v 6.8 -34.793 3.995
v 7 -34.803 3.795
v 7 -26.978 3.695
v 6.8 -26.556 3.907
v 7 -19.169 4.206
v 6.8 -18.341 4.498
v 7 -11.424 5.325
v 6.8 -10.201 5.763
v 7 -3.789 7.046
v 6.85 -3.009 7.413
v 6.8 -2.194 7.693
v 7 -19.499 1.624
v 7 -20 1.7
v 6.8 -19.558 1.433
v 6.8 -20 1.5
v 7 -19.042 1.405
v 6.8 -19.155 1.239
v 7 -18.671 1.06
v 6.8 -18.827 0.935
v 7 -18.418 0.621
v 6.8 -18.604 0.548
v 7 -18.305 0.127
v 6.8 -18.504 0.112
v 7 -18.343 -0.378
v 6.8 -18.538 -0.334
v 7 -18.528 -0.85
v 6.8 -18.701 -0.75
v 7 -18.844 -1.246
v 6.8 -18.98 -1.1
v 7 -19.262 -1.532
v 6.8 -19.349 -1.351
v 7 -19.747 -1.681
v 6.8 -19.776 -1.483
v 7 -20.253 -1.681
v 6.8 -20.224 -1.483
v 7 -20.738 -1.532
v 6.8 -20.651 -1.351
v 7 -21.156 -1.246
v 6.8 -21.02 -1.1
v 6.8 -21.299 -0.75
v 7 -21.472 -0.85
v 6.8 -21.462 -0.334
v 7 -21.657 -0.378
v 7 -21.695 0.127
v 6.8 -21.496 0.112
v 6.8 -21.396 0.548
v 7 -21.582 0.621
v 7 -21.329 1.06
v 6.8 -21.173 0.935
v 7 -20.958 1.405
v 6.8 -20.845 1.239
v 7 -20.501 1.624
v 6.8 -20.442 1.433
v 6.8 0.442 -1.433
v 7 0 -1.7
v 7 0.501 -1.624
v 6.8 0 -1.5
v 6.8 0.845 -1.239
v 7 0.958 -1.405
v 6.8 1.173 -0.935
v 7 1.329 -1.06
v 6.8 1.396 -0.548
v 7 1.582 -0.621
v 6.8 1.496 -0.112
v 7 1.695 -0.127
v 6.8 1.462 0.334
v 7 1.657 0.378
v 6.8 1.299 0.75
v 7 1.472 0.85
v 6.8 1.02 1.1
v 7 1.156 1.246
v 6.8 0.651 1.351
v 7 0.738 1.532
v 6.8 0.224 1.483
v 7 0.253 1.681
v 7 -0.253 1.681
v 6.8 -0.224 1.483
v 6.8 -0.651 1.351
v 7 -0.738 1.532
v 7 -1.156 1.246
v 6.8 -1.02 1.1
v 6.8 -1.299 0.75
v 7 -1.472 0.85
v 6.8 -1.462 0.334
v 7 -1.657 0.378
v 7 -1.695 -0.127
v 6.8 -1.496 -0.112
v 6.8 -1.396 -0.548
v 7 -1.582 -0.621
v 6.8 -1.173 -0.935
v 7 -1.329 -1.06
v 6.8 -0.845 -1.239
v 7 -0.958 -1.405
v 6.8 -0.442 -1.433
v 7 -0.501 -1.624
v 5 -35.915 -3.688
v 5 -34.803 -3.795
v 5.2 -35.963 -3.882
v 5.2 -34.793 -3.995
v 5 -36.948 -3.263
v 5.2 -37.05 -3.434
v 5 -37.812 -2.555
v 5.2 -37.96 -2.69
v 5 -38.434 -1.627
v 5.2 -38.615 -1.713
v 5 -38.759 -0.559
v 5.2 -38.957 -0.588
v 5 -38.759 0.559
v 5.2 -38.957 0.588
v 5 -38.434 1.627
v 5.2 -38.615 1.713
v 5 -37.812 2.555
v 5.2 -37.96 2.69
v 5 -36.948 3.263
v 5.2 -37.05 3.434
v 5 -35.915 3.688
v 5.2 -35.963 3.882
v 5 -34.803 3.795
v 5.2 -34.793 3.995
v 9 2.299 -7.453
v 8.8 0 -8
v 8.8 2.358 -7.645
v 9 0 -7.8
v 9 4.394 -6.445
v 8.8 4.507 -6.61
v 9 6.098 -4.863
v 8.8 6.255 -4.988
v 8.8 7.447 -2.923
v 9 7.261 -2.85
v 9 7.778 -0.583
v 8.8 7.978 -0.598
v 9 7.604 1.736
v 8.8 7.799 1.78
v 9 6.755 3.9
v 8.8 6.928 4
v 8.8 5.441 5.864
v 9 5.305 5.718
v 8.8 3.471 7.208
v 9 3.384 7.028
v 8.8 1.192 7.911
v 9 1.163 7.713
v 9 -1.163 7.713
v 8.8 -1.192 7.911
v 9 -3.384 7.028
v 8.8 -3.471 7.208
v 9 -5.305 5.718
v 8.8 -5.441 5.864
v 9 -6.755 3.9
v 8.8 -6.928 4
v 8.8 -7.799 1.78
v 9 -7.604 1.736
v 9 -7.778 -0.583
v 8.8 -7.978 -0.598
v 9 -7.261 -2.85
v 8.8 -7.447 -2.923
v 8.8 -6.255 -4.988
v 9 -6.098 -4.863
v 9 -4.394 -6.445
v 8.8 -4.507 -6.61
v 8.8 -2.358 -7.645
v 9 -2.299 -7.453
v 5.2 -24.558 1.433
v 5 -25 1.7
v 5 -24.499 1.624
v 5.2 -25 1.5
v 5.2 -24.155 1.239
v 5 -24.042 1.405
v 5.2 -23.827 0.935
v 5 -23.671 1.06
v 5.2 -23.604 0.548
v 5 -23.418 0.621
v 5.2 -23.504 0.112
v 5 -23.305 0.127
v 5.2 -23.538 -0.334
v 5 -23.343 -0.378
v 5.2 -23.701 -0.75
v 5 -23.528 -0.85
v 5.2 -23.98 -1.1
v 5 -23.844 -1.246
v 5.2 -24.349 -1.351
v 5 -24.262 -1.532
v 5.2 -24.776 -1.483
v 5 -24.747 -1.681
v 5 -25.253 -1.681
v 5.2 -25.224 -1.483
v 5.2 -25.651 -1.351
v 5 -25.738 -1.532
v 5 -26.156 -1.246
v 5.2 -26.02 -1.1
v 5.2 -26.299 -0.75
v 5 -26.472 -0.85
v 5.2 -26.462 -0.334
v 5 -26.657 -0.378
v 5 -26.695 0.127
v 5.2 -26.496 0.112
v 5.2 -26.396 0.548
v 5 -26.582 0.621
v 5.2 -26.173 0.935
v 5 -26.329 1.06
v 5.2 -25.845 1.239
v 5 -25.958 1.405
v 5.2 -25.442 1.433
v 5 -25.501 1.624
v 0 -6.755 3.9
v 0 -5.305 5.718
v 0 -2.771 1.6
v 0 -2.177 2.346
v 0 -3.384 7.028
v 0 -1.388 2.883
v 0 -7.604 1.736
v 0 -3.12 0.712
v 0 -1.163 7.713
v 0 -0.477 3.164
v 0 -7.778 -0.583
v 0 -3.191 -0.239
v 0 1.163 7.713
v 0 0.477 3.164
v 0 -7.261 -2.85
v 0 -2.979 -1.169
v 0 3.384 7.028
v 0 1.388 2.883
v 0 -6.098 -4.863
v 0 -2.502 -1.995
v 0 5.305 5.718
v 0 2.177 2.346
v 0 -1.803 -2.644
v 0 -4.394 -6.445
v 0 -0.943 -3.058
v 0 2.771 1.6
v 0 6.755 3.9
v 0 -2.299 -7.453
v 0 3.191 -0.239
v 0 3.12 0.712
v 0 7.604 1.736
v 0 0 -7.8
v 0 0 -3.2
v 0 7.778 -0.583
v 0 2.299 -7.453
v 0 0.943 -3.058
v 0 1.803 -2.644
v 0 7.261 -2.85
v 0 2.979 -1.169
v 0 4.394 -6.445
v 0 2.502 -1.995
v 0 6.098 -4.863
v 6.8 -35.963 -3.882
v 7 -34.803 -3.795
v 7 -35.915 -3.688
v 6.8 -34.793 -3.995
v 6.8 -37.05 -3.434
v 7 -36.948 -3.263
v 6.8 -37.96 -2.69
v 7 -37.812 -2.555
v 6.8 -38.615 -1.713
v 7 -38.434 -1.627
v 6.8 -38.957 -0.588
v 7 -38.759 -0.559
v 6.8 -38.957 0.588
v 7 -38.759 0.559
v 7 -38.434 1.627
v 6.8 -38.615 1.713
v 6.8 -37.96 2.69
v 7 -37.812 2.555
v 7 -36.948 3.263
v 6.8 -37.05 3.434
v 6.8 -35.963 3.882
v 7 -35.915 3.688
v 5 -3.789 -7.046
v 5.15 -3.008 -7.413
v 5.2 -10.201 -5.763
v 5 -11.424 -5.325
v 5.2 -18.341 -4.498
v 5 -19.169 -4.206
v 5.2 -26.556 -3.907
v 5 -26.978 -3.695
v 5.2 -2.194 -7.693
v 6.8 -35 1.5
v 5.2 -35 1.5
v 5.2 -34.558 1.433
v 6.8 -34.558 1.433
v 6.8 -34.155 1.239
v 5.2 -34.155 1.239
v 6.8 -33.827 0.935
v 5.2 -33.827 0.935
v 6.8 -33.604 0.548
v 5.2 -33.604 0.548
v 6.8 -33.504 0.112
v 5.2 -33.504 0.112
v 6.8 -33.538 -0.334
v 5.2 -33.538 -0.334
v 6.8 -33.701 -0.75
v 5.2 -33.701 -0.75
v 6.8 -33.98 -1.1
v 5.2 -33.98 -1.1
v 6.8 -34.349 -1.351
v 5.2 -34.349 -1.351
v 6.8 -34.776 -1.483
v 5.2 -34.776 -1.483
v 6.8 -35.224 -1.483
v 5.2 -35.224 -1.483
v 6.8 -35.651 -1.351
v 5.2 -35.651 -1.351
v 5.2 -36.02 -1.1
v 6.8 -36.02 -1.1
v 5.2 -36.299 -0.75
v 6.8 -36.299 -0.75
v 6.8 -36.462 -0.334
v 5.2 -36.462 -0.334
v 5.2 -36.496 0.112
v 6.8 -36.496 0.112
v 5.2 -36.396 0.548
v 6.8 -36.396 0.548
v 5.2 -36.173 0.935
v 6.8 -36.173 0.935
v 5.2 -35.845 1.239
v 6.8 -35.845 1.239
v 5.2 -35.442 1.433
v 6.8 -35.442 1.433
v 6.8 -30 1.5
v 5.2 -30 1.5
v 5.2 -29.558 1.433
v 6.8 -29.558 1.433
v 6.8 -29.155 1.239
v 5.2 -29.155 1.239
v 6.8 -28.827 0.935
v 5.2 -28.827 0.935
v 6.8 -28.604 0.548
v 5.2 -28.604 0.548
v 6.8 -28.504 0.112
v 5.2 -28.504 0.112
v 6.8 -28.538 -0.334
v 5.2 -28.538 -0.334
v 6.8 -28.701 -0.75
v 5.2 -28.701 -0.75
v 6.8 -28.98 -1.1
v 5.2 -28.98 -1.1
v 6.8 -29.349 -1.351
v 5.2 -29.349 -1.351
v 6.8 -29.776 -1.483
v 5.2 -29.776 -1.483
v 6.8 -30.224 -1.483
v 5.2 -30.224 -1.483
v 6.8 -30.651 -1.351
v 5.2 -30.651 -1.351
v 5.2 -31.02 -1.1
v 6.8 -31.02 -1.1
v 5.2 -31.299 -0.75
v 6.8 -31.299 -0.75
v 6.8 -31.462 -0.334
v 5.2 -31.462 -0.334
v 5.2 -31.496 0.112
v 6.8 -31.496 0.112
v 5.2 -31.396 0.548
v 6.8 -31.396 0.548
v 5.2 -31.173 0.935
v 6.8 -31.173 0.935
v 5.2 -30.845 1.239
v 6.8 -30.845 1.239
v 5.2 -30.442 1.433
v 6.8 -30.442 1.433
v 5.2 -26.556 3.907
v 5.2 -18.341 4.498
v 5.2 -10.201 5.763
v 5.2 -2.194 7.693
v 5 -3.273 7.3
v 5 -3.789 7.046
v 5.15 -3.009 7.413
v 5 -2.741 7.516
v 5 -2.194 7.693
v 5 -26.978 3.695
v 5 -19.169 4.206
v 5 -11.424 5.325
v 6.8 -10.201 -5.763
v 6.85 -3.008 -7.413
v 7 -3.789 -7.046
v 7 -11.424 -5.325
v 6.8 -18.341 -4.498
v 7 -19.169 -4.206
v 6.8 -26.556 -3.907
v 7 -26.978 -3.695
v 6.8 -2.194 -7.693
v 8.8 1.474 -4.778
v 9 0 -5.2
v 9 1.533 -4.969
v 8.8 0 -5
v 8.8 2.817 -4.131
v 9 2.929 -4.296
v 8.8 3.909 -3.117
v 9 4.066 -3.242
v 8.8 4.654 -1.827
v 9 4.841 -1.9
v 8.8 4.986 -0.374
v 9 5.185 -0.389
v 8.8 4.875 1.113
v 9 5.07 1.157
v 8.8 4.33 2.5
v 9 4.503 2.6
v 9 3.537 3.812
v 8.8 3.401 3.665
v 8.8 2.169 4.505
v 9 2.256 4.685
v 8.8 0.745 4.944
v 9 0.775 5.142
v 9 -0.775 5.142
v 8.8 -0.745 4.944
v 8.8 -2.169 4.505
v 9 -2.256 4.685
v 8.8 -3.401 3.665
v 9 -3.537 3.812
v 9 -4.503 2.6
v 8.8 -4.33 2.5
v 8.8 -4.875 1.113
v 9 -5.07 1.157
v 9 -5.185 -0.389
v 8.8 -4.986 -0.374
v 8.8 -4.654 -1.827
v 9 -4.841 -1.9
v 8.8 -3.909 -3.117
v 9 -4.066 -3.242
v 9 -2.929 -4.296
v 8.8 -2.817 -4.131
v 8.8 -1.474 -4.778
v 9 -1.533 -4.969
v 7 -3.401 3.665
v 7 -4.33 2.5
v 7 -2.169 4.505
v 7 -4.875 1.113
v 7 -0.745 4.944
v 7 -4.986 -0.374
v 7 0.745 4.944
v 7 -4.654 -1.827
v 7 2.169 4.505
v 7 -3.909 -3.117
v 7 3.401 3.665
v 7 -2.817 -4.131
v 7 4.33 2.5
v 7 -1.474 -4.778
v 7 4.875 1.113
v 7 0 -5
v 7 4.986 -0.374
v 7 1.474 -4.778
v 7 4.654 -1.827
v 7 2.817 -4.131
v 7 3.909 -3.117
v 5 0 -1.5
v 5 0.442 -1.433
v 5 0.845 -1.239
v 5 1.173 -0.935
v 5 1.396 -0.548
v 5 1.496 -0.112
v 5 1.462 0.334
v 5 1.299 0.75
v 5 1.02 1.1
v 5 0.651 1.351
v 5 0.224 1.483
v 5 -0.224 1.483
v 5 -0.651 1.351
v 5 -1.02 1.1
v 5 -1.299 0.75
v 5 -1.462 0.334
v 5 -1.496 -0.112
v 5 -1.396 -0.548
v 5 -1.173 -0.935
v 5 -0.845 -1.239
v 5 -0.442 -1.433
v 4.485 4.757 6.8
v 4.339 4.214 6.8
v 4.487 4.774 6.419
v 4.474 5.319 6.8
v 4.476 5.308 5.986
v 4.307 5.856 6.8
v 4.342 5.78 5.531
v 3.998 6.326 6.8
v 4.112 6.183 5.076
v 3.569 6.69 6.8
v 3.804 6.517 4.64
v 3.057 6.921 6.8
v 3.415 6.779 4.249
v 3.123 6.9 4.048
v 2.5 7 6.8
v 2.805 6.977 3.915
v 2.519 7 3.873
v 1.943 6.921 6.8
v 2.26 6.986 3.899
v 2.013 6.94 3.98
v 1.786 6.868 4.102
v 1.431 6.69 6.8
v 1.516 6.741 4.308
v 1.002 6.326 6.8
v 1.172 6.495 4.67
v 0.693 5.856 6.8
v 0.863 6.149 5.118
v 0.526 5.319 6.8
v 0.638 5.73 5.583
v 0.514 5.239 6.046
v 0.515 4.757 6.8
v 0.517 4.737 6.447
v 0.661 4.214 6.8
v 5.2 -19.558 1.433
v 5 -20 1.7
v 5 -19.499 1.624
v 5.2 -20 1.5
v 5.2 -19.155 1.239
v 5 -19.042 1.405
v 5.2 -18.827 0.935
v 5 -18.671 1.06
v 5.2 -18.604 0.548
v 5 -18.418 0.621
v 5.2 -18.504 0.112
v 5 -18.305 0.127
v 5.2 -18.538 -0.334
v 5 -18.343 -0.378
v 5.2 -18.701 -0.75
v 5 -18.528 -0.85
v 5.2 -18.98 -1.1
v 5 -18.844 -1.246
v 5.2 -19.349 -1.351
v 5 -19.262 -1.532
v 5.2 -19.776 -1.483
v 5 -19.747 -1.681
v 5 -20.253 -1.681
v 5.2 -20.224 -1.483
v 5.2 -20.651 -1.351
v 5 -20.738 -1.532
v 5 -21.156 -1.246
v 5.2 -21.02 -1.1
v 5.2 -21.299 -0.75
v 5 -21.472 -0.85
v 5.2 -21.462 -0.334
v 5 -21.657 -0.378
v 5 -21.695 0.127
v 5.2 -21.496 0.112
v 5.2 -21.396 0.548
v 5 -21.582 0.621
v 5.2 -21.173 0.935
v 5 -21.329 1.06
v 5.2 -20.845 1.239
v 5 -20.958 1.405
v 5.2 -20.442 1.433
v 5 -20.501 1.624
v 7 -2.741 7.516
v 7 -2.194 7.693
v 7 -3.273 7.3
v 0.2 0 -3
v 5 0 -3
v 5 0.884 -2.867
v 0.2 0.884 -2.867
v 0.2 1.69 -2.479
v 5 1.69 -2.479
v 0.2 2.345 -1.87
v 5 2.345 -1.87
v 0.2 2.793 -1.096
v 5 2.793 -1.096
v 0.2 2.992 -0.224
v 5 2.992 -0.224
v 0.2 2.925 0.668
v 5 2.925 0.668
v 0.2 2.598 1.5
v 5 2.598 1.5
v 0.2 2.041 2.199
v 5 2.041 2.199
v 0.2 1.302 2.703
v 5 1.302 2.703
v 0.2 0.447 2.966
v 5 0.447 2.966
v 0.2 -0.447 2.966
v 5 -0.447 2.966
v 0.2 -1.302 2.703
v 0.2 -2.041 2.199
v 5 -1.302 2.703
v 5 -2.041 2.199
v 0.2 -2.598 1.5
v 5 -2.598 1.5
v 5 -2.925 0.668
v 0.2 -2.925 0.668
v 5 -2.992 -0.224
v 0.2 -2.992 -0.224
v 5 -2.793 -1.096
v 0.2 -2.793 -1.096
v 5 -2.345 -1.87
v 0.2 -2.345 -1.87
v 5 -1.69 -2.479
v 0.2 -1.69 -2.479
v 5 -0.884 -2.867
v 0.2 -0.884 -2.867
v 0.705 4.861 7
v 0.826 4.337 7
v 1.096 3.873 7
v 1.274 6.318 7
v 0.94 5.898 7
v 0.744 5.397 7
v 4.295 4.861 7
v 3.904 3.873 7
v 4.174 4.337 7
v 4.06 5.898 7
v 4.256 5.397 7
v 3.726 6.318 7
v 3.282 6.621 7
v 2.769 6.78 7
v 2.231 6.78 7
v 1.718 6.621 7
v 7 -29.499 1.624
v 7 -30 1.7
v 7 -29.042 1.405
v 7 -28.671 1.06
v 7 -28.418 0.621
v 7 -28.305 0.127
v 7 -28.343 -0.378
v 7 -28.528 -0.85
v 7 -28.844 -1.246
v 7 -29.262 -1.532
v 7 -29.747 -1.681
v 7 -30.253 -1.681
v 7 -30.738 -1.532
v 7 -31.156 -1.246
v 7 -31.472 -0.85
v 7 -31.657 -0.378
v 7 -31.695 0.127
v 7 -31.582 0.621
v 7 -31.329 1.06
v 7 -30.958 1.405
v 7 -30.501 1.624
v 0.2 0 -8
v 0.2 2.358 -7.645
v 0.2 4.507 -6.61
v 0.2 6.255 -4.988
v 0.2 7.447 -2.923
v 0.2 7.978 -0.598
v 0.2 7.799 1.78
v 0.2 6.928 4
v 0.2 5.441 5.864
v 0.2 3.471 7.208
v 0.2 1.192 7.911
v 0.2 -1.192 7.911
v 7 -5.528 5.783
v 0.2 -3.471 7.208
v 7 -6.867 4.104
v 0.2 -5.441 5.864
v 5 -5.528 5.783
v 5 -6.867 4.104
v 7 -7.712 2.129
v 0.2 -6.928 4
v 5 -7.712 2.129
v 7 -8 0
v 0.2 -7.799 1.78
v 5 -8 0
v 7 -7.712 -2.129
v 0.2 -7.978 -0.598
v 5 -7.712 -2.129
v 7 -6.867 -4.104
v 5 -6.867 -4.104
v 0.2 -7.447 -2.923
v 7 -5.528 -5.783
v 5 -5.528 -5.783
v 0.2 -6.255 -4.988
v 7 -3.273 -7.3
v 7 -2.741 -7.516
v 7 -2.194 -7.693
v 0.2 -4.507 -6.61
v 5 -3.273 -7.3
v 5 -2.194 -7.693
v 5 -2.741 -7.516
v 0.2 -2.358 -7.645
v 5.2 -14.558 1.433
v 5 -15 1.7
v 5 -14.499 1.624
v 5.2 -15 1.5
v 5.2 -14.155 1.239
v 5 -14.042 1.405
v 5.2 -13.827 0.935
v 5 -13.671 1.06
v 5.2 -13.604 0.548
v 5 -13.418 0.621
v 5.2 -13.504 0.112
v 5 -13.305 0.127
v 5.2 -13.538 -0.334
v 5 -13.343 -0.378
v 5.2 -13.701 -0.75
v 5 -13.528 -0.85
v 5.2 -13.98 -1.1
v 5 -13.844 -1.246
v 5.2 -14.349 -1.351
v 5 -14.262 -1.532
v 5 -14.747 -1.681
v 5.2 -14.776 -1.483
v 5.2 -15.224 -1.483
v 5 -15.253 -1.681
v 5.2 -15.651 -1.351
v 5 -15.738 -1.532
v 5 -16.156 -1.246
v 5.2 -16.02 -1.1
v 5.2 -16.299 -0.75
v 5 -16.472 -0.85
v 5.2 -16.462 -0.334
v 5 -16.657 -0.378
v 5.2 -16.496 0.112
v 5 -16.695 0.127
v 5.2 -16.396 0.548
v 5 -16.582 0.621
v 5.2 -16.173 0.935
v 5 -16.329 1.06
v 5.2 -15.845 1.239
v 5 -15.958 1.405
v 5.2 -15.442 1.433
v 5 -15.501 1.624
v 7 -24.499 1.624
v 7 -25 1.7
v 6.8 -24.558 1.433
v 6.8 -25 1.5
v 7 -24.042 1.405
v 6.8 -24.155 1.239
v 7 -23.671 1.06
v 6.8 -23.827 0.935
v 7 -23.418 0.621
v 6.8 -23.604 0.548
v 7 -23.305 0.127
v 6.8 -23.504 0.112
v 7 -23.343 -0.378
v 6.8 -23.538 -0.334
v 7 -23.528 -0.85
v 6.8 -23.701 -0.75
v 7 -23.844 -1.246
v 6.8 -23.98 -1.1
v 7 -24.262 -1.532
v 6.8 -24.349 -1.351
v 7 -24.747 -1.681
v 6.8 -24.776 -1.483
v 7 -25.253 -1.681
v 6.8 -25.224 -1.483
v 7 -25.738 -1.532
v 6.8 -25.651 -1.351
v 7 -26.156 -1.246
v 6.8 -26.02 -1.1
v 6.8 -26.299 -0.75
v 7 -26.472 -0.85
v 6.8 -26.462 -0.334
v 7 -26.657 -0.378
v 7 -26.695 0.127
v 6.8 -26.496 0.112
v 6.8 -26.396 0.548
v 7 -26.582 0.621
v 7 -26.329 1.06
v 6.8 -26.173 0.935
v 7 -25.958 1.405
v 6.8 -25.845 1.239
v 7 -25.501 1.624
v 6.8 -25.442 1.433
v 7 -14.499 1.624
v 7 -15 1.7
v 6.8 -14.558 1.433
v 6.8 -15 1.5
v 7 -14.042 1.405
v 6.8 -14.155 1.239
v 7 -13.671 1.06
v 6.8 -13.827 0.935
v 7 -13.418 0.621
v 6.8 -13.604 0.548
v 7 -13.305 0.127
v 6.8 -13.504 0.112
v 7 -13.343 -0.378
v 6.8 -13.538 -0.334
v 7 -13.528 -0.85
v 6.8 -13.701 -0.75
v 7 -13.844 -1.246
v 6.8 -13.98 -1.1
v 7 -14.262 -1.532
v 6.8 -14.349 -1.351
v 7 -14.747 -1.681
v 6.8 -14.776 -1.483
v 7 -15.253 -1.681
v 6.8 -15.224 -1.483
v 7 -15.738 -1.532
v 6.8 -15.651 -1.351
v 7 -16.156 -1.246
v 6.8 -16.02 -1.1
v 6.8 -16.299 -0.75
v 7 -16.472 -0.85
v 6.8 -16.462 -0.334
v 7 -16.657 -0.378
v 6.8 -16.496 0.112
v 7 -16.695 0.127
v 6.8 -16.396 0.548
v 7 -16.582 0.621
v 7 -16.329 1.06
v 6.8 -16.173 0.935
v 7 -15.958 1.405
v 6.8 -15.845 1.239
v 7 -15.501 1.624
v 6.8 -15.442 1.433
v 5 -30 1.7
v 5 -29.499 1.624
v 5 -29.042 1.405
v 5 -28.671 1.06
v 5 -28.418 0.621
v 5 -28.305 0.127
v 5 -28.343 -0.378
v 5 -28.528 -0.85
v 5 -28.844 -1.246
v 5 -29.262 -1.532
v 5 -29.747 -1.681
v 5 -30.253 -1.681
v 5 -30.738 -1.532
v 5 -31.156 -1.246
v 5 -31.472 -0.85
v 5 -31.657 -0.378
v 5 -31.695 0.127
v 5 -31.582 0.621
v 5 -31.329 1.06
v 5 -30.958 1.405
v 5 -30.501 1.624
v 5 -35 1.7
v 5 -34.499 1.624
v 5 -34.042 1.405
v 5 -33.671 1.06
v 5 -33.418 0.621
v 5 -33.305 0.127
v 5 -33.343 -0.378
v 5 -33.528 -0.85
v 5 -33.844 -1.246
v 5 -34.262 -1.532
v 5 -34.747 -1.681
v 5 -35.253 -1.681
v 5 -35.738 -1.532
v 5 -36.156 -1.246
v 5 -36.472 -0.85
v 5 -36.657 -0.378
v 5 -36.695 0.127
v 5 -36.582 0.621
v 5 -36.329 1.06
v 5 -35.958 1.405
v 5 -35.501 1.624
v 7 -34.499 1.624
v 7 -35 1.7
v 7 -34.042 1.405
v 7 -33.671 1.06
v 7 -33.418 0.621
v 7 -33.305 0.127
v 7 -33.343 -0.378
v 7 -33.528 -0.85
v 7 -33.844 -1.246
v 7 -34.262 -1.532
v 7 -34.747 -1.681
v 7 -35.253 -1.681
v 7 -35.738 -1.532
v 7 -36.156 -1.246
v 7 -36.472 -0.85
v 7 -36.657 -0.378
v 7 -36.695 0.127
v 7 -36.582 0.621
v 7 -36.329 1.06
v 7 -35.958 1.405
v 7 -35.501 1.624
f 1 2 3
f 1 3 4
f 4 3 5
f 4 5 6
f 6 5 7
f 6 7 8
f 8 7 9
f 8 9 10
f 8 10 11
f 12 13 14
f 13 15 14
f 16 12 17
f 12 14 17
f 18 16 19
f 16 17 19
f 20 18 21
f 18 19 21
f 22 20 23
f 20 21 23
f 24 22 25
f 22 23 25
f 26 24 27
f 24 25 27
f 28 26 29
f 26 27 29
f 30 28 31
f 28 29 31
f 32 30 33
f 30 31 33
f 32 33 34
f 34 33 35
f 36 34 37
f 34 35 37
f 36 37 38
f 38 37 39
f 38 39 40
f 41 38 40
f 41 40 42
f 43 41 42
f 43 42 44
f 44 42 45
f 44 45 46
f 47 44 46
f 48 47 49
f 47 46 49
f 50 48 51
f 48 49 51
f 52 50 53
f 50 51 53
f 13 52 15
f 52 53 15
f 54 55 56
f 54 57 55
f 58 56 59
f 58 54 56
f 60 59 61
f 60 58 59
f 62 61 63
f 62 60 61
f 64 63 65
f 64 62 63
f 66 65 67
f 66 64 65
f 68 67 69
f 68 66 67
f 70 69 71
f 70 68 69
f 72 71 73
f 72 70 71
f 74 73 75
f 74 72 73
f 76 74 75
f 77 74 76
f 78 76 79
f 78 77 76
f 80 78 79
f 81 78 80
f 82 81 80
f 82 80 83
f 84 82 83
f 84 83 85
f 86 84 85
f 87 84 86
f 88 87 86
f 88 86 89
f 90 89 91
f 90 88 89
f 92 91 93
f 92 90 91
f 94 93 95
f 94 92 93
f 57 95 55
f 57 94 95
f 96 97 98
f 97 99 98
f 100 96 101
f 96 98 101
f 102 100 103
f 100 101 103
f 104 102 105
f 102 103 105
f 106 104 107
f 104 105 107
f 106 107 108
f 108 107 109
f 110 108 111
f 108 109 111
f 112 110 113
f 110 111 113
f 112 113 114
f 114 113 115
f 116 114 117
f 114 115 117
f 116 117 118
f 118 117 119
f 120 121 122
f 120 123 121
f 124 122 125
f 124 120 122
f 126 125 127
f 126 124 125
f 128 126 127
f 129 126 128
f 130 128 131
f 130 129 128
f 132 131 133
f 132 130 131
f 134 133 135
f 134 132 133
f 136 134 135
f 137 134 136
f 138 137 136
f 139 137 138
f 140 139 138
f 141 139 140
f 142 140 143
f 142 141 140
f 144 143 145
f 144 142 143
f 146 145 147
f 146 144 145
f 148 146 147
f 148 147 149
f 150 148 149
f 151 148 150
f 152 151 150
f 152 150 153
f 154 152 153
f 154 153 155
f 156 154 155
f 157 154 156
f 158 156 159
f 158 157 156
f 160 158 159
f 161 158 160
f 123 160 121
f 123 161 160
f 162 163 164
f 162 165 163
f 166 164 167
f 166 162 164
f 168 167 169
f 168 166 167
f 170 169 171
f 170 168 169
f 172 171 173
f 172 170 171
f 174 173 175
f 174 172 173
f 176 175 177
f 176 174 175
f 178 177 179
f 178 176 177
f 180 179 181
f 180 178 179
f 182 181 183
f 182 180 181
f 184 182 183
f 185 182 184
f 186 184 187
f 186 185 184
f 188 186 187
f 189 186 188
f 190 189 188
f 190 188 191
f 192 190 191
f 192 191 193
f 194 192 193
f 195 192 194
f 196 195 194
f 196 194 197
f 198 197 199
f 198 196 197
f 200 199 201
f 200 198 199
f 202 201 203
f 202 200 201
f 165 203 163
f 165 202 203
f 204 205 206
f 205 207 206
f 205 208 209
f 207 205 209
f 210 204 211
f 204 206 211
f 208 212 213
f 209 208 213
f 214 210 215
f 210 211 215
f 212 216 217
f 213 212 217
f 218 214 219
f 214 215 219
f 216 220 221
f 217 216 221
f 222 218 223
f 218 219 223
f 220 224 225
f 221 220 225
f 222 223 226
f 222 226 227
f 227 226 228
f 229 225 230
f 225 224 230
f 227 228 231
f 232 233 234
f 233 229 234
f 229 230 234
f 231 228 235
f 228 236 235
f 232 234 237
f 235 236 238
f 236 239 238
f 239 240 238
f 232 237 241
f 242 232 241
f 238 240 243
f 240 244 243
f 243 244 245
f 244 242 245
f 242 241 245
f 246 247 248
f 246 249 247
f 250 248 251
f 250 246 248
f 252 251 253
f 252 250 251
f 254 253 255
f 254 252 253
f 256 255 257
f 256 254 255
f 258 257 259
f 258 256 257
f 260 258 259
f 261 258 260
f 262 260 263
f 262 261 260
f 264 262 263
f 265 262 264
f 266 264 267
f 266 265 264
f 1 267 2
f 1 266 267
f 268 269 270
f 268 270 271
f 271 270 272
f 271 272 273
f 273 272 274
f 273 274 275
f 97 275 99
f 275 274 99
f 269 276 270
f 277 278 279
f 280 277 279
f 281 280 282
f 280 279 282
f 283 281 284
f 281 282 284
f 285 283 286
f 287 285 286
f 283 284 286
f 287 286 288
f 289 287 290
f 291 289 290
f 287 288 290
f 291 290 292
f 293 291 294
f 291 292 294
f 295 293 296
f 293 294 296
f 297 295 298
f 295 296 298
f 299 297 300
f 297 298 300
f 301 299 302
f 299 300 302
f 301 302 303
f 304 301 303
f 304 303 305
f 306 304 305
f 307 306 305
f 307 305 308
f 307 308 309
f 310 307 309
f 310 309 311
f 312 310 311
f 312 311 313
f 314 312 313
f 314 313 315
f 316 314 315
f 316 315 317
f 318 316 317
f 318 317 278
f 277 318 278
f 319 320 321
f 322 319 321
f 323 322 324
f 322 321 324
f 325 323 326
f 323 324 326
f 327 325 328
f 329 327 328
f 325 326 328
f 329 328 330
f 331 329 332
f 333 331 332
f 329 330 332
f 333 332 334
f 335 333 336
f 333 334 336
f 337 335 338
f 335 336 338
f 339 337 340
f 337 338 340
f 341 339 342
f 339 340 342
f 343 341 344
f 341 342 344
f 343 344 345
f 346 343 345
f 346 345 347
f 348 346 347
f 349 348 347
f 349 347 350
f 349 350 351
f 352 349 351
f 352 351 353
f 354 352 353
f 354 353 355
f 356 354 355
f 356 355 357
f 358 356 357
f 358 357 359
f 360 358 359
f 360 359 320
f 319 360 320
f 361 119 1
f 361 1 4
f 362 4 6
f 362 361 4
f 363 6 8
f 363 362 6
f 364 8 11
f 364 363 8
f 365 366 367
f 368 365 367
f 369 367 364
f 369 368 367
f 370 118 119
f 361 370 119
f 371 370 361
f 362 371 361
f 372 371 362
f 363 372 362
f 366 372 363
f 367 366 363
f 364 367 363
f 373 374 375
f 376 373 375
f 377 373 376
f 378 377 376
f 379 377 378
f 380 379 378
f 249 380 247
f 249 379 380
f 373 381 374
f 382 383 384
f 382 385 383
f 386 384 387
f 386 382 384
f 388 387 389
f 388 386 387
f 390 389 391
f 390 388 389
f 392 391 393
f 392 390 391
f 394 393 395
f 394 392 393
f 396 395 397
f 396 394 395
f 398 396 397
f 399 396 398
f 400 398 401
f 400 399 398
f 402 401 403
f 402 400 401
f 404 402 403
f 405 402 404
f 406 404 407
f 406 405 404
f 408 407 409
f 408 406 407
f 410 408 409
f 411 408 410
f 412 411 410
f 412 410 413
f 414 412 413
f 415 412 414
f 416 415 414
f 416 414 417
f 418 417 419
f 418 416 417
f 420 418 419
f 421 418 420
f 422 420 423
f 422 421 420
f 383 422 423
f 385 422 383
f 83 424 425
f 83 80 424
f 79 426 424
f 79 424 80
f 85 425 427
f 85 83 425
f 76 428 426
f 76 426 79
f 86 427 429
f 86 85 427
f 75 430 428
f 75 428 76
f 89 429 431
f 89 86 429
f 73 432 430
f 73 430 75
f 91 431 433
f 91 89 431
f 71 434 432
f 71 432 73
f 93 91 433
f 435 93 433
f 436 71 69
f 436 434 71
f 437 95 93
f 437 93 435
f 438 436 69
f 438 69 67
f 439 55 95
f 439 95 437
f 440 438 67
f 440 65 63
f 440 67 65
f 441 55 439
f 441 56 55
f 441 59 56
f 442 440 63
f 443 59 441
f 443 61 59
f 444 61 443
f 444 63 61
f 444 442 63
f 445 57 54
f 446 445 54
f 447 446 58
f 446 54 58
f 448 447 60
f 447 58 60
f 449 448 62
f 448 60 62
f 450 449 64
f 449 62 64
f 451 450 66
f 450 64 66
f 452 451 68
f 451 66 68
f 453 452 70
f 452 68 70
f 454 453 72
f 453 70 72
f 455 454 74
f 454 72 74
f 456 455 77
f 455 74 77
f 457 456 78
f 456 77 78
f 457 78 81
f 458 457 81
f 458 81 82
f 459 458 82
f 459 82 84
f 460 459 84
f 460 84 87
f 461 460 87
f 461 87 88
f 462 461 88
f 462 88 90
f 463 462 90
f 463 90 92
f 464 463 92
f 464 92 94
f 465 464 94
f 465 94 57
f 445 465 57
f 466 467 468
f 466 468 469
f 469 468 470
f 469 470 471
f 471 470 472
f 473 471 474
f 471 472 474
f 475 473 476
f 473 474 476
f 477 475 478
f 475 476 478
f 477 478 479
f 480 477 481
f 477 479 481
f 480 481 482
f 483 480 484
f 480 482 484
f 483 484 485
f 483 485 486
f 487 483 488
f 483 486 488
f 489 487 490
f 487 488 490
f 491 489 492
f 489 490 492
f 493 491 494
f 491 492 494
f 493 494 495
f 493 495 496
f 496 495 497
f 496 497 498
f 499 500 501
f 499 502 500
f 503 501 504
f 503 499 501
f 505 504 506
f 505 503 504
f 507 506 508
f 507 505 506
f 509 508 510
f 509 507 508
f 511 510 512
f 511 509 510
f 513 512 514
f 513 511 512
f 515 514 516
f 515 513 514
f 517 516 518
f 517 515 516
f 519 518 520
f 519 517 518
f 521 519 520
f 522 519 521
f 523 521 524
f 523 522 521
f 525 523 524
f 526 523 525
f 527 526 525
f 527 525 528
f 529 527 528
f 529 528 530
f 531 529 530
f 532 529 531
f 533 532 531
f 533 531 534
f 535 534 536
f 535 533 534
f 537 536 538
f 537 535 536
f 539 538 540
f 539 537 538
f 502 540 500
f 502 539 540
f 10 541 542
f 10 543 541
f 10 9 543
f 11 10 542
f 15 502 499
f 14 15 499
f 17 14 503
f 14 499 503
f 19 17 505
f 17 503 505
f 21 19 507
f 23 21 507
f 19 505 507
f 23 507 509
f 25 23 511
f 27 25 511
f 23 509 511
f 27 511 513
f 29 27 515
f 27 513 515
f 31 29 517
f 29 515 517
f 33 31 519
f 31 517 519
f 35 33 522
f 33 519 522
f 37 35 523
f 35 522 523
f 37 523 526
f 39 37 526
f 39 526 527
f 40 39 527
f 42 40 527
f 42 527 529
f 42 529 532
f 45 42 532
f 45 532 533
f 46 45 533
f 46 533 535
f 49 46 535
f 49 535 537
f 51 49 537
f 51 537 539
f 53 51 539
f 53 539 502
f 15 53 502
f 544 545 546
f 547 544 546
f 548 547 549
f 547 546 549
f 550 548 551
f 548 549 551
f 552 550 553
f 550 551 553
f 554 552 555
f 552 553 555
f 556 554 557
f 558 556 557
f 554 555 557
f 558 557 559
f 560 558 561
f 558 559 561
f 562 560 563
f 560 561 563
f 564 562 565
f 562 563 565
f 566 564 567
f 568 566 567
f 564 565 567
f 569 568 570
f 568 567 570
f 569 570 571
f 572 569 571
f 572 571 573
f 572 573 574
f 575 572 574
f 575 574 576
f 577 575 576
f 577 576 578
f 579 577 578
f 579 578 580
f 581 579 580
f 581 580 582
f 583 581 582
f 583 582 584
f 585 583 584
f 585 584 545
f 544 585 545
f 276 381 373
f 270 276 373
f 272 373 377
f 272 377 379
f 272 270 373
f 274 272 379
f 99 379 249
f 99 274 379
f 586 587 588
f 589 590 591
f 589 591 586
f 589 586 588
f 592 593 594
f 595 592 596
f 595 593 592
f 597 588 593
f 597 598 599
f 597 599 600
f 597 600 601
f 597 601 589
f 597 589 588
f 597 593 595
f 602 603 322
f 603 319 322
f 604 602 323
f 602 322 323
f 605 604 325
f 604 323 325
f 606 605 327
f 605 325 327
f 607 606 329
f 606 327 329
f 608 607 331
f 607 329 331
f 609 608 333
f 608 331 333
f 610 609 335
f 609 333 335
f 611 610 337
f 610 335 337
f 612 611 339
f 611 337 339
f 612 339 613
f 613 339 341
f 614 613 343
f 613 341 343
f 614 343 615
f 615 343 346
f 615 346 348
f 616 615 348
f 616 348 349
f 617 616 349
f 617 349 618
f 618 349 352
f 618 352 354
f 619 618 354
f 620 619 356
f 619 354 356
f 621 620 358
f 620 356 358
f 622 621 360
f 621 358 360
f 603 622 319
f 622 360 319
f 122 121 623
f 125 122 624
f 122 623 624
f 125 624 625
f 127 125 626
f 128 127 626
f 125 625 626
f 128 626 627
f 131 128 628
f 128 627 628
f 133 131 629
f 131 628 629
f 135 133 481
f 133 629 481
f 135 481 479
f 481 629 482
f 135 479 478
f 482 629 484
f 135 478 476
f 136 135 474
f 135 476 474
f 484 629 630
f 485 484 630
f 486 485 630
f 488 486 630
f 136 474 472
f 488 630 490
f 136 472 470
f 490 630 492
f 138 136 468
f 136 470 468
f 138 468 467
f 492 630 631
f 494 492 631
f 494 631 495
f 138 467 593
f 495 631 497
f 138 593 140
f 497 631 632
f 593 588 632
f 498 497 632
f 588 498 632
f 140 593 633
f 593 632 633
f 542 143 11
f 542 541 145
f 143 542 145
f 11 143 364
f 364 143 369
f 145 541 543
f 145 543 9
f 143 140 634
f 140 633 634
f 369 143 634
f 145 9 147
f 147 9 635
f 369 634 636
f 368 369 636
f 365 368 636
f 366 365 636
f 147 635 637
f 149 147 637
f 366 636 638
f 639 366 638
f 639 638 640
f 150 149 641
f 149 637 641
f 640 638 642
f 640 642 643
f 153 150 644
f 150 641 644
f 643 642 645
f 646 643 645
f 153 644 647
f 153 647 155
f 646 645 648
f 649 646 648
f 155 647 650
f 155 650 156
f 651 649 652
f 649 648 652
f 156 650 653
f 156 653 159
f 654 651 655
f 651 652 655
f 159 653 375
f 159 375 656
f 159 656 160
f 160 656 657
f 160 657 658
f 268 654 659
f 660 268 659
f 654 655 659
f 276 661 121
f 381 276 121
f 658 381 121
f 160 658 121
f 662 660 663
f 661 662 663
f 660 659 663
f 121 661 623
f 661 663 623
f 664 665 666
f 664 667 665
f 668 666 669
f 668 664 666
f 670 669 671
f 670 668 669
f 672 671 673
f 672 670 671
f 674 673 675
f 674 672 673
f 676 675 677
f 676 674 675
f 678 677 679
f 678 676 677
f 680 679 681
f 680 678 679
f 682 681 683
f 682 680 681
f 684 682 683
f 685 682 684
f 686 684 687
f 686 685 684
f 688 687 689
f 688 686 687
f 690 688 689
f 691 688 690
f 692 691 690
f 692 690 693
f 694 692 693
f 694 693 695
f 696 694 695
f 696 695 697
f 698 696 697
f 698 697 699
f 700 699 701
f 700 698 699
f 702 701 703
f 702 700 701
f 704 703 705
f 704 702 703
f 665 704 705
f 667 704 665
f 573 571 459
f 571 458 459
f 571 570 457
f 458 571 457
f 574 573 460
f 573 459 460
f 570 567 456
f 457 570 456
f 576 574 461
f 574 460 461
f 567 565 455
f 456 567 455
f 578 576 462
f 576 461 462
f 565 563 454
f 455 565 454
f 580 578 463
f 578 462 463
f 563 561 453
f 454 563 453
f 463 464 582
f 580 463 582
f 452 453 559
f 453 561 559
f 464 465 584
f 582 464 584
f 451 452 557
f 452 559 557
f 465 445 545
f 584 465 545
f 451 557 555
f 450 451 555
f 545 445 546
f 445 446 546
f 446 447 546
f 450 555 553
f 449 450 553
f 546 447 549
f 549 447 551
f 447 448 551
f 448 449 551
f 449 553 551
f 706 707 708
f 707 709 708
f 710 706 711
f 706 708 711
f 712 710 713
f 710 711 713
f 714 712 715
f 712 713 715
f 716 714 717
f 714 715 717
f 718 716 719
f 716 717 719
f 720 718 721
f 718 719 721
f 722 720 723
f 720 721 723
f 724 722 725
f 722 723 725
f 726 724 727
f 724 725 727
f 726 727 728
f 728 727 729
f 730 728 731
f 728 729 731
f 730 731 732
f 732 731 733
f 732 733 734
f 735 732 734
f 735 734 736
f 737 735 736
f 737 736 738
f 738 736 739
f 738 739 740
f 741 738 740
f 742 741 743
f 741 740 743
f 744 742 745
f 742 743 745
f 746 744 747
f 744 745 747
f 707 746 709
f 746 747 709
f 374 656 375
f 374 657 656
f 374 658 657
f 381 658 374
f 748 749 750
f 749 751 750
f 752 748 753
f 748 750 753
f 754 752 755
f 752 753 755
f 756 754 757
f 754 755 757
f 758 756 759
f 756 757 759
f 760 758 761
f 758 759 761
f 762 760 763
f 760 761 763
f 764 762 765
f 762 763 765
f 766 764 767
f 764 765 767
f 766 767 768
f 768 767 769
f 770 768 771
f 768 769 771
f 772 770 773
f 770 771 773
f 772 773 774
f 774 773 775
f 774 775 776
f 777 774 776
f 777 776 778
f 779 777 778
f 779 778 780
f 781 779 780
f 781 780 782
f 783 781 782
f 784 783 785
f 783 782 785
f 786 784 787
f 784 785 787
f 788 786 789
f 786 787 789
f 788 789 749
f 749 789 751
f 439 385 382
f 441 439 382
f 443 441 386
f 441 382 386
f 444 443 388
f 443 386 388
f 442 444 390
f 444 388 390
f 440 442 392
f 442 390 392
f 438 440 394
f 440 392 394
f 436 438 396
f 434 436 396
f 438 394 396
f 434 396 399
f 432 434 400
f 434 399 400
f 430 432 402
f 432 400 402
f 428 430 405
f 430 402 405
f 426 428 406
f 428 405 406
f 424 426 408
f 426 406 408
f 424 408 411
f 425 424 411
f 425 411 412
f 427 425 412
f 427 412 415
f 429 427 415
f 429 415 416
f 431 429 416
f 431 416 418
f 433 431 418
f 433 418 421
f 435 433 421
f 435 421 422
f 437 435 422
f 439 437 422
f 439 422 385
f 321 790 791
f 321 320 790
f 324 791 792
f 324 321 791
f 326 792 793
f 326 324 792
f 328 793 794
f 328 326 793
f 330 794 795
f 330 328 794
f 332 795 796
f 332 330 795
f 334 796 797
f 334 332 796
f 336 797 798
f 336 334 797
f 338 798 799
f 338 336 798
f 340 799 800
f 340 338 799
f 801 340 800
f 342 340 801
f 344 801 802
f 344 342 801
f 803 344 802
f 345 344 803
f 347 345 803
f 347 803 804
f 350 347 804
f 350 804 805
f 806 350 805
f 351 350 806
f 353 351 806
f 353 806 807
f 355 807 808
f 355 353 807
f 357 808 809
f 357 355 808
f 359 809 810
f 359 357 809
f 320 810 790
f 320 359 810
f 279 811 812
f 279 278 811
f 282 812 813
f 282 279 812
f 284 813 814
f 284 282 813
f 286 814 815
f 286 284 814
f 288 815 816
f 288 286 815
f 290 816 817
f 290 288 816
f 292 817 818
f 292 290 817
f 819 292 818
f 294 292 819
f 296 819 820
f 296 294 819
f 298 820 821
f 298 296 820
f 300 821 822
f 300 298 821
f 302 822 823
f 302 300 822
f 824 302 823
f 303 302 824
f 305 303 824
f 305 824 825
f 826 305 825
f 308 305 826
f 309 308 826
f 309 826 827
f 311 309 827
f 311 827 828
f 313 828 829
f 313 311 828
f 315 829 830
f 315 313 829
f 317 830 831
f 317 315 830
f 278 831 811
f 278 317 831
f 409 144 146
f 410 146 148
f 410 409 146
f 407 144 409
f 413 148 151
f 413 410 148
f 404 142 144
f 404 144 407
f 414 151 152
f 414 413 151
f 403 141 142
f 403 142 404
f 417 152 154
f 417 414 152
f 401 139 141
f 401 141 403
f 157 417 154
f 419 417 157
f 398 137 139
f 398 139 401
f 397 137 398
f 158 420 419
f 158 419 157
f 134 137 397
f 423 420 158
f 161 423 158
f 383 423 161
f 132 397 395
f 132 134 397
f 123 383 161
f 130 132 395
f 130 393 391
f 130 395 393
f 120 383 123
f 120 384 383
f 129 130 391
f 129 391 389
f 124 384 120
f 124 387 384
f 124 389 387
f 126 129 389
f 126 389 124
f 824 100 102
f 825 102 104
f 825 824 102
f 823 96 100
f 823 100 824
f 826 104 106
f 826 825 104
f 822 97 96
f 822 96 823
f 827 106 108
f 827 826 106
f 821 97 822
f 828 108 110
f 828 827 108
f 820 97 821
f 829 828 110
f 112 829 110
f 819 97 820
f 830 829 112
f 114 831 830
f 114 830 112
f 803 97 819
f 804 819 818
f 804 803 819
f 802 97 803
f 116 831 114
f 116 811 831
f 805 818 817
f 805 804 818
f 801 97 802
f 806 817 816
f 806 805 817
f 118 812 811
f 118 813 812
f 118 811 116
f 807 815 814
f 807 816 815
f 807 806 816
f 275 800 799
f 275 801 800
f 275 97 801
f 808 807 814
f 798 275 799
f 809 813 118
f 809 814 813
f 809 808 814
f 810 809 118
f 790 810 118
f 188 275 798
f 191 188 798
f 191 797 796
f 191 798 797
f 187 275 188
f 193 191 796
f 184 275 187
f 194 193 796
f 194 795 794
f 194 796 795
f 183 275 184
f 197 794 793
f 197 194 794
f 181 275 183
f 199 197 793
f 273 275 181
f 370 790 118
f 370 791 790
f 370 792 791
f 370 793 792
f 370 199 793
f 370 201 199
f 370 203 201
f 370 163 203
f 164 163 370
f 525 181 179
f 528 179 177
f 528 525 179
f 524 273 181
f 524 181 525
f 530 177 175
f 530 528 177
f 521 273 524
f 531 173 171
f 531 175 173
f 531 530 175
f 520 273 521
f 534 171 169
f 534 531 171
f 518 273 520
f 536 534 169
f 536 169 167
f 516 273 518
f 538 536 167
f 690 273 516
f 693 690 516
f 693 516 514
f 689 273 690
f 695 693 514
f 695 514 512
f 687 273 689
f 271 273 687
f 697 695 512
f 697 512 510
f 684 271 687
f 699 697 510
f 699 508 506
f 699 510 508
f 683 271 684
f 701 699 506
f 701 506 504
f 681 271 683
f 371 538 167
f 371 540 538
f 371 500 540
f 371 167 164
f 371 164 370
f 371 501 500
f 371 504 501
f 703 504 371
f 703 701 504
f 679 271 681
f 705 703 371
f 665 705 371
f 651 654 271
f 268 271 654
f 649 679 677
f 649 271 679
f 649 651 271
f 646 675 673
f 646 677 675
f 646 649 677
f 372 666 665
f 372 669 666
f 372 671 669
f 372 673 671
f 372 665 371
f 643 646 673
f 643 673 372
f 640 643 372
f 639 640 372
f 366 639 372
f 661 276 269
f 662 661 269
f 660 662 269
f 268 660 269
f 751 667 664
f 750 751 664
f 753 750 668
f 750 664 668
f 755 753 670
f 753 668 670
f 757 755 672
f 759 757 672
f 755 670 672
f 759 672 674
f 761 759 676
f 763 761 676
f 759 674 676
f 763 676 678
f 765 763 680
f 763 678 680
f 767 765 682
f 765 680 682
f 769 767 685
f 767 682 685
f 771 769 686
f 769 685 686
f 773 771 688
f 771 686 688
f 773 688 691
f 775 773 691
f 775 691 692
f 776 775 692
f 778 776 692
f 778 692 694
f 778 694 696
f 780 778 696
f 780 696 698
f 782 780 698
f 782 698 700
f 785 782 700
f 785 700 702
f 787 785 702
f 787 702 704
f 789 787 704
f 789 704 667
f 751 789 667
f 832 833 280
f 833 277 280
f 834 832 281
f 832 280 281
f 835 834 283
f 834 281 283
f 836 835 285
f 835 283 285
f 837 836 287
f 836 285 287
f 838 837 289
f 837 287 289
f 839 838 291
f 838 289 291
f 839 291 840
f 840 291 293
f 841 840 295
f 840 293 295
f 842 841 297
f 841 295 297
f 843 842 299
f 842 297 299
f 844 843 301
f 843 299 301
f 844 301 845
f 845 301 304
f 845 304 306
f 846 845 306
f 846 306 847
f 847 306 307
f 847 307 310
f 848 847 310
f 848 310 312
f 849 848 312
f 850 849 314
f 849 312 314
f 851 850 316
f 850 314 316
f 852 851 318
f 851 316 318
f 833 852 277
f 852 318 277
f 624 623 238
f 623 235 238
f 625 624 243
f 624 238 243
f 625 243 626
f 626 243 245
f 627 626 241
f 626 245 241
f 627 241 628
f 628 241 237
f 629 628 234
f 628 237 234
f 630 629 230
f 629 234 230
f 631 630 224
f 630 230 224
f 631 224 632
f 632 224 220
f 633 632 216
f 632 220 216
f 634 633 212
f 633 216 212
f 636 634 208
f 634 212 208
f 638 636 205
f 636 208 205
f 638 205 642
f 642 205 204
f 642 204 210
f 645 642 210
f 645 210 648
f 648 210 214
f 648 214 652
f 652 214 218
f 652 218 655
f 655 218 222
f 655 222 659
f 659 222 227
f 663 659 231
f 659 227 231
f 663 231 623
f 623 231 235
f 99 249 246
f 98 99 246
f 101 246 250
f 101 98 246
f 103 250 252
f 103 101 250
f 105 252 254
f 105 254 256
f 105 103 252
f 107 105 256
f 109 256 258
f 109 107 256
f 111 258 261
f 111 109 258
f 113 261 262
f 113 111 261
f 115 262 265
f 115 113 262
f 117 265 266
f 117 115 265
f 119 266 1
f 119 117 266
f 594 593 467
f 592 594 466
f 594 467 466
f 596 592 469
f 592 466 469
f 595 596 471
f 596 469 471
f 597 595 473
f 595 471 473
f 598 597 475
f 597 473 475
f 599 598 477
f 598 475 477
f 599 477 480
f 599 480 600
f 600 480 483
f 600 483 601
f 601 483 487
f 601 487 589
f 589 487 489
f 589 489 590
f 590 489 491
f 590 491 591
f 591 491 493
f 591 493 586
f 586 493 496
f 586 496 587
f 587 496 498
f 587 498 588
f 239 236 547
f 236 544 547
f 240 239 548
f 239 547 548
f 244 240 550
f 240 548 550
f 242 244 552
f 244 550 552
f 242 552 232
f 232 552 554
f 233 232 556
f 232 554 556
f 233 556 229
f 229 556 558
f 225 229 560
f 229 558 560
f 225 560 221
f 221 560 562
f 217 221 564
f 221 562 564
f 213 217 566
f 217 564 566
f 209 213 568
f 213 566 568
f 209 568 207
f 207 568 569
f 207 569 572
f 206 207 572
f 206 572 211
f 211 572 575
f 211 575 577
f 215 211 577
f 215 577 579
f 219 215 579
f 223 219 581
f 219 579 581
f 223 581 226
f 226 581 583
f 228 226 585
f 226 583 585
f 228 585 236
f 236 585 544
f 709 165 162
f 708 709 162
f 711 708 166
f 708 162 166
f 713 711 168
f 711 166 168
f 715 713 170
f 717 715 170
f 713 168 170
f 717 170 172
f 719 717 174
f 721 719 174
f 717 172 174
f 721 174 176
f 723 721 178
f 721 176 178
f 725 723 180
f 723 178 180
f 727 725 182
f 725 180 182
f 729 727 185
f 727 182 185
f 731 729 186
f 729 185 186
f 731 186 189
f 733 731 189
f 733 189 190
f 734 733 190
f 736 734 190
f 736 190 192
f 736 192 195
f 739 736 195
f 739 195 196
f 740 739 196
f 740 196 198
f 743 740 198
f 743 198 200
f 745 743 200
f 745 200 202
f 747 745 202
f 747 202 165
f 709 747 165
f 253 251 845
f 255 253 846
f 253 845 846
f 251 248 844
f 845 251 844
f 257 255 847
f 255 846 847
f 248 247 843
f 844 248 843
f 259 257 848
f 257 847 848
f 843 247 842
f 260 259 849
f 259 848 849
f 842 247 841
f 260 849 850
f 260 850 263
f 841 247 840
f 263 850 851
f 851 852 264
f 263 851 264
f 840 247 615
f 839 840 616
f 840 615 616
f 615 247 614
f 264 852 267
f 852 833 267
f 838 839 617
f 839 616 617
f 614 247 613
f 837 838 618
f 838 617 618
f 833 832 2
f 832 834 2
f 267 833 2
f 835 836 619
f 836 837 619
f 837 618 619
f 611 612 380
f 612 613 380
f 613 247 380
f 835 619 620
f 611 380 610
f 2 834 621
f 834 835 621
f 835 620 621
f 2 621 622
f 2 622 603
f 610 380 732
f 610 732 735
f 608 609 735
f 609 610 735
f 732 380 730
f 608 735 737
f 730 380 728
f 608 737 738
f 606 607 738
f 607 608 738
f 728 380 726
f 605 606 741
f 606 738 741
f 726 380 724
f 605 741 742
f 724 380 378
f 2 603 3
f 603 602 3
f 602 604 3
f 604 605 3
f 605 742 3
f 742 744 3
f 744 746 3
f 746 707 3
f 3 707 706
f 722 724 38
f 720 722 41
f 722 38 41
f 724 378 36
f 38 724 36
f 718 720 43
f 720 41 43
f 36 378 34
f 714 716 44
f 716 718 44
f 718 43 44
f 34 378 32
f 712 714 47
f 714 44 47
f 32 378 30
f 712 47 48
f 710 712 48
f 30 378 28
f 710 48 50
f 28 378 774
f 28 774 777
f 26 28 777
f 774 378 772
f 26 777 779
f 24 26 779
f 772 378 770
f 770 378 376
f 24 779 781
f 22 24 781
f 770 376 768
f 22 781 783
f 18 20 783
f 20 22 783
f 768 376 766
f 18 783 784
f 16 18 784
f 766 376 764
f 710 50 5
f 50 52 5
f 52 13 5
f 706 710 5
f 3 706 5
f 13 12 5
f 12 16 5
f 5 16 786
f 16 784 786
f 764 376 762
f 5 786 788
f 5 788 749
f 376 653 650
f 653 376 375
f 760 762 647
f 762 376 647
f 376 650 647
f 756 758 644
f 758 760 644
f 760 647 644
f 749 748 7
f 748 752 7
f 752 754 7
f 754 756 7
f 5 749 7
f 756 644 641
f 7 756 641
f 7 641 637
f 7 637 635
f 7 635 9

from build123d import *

# Parameters (mm, degrees)
SKETCH_1_R          = 8
EXTRUDE_1_DEPTH     = 9
SKETCH_2_R          = 5
CUT_EXTRUDE_1_DEPTH = 2
SKETCH_3_R          = 1.5
CUT_EXTRUDE_2_DEPTH = 2
SKETCH_4_R          = 3
CUT_EXTRUDE_3_DEPTH = 5
SKETCH_6_R          = 2
EXTRUDE_2_DEPTH     = 7
SKETCH_7_R          = 1.5
EXTRUDE_3_DEPTH     = 2
CHAMFER_1_SIZE      = 0.2
CHAMFER_2_SIZE      = 0.2


with BuildPart() as part:
    # 草图1 → 凸台-拉伸1 (new body)
    with BuildSketch(Plane(origin=(0, 0, 0), x_dir=(0, 0, -1), z_dir=(1, 0, 0))):
        Circle(SKETCH_1_R)
    extrude(amount=EXTRUDE_1_DEPTH)

    # 草图2 → 切除-拉伸1 (cut)
    with BuildSketch(Plane(origin=(9, 0, 0), x_dir=(0, 0, -1), z_dir=(1, 0, 0))):
        Circle(SKETCH_2_R)
    extrude(amount=-CUT_EXTRUDE_1_DEPTH, mode=Mode.SUBTRACT)

    # 草图3 → 切除-拉伸2 (cut)
    with BuildSketch(Plane(origin=(7, 0, 0), x_dir=(0, 0, -1), z_dir=(1, 0, 0))):
        Circle(SKETCH_3_R)
    extrude(amount=-CUT_EXTRUDE_2_DEPTH, mode=Mode.SUBTRACT)

    # 草图4 → 切除-拉伸3 (cut)
    with BuildSketch(Plane(origin=(5, 0, 0), x_dir=(0, 0, -1), z_dir=(1, 0, 0))):
        Circle(SKETCH_4_R)
    extrude(amount=-CUT_EXTRUDE_3_DEPTH, mode=Mode.SUBTRACT)

    # 草图6 → 凸台-拉伸2 (add)
    with BuildSketch(Plane.XY):
        with Locations((2.5, 5)):
            Circle(SKETCH_6_R)
    extrude(amount=EXTRUDE_2_DEPTH)

    # 草图7 → 凸台-拉伸3 (add)
    with BuildSketch(Plane.ZY.offset(-5)):
        with BuildLine():
            ThreePointArc((-3.994632879, -34.792857143), (0, -39), (3.994632879, -34.792857143))
            ThreePointArc((3.994632879, -34.792857143), (4.497974535, -18.34053276), (7.693367026, -2.193650794))
            ThreePointArc((7.693367026, -2.193650794), (0, -8), (-7.693367026, -2.193650794))
            ThreePointArc((-7.693367026, -2.193650794), (-4.497974535, -18.34053276), (-3.994632879, -34.792857143))
        make_face()
        with Locations((0, -35)):
            Circle(SKETCH_7_R, mode=Mode.SUBTRACT)
        with Locations((0, -30)):
            Circle(SKETCH_7_R, mode=Mode.SUBTRACT)
        with Locations((0, -25)):
            Circle(SKETCH_7_R, mode=Mode.SUBTRACT)
        with Locations((0, -20)):
            Circle(SKETCH_7_R, mode=Mode.SUBTRACT)
        with Locations((0, -15)):
            Circle(SKETCH_7_R, mode=Mode.SUBTRACT)
    extrude(amount=-EXTRUDE_3_DEPTH)

    # 倒角1
    # the kernel refuses this chamfer: 0.2 mm, written as the material it takes off along each edge
    with BuildSketch(Plane(origin=(2.5, 5, 7), x_dir=(0.6550221051171238, -0.7556097152683597, 0), z_dir=(-0.7556097152683597, -0.6550221051171238, 0))) as chamfer_1_piece_1_section:
        Polygon((2 - CHAMFER_1_SIZE, 0), (2, -CHAMFER_1_SIZE), (2, 0), align=None)
    chamfer_1_piece_1 = revolve(axis=Axis((2.5, 5, 7), (0, 0, 1)), revolution_arc=278.157347794, mode=Mode.PRIVATE)
    chamfer_1_piece_1 = chamfer_1_piece_1 - Plane(origin=(2.5, 0, 0), x_dir=(0, 0, -1), z_dir=(-1, 0, 0)) * Cylinder(8, 9, mode=Mode.PRIVATE)
    add(chamfer_1_piece_1, mode=Mode.SUBTRACT)
    with BuildSketch(Plane(origin=(0, 0, 0), x_dir=(0, 0, -1), z_dir=(0, -1, 0))) as chamfer_1_piece_2:
        Polygon((3 + CHAMFER_1_SIZE, 0), (3, CHAMFER_1_SIZE), (3, 0), align=None)
    revolve(axis=Axis((0, 0, 0), (1, 0, 0)), mode=Mode.SUBTRACT)
    with BuildSketch(Plane(origin=(0, 0, 0), x_dir=(0, 0, -1), z_dir=(0, -1, 0))) as chamfer_1_piece_3:
        Polygon((8, CHAMFER_1_SIZE), (8 - CHAMFER_1_SIZE, 0), (8, 0), align=None)
    revolve(axis=Axis((0, 0, 0), (1, 0, 0)), mode=Mode.SUBTRACT)
    with BuildSketch(Plane(origin=(7, 0, 0), x_dir=(0, 0, -1), z_dir=(0, -1, 0))) as chamfer_1_piece_4:
        Polygon((1.5 + CHAMFER_1_SIZE, 0), (1.5, -CHAMFER_1_SIZE), (1.5, 0), align=None)
    revolve(axis=Axis((7, 0, 0), (1, 0, 0)), mode=Mode.SUBTRACT)
    with BuildSketch(Plane(origin=(9, 0, 0), x_dir=(0, 0, -1), z_dir=(0, -1, 0))) as chamfer_1_piece_5:
        Polygon((5 + CHAMFER_1_SIZE, 0), (5, -CHAMFER_1_SIZE), (5, 0), align=None)
    revolve(axis=Axis((9, 0, 0), (1, 0, 0)), mode=Mode.SUBTRACT)
    with BuildSketch(Plane(origin=(9, 0, 0), x_dir=(0, 0, -1), z_dir=(0, -1, 0))) as chamfer_1_piece_6:
        Polygon((8, -CHAMFER_1_SIZE), (8 - CHAMFER_1_SIZE, 0), (8, 0), align=None)
    revolve(axis=Axis((9, 0, 0), (1, 0, 0)), mode=Mode.SUBTRACT)

    # 倒角2
    # the kernel refuses this chamfer: 0.2 mm, written as the material it takes off along each edge
    with BuildSketch(Plane(origin=(7, -29.614285714, 103.86045485), x_dir=(0, -0.05178571428571552, -0.9986582197107868), z_dir=(0, -0.9986582197107868, 0.05178571428571552))) as chamfer_2_piece_1_section:
        Polygon((100, -CHAMFER_2_SIZE), (100 + CHAMFER_2_SIZE, 0), (100, 0), align=None)
    chamfer_2_piece_1 = revolve(axis=Axis((7, -29.614285714, 103.86045485), (1, 0, 0)), revolution_arc=20.356645861, mode=Mode.PRIVATE)
    chamfer_2_piece_1 = chamfer_2_piece_1 - Plane(origin=(7, 0, 0), x_dir=(0, 0, -1), z_dir=(-1, 0, 0)) * Cylinder(8, 401, mode=Mode.PRIVATE)
    add(chamfer_2_piece_1, mode=Mode.SUBTRACT)
    with BuildSketch(Plane(origin=(7, -35, 0), x_dir=(0, 0.05178571428571369, -0.9986582197107869), z_dir=(0, 0.9986582197107869, 0.05178571428571369))) as chamfer_2_piece_2:
        Polygon((4 - CHAMFER_2_SIZE, 0), (4, CHAMFER_2_SIZE), (4, 0), align=None)
    revolve(axis=Axis((7, -35, 0), (-1, 0, 0)), revolution_arc=185.936861294, mode=Mode.SUBTRACT)
    with BuildSketch(Plane(origin=(7, -29.614285714, -103.86045485), x_dir=(0, 0.29884451461423694, 0.9543018160335759), z_dir=(0, 0.9543018160335759, -0.29884451461423694))) as chamfer_2_piece_3_section:
        Polygon((100 + CHAMFER_2_SIZE, 0), (100, -CHAMFER_2_SIZE), (100, 0), align=None)
    chamfer_2_piece_3 = revolve(axis=Axis((7, -29.614285714, -103.86045485), (1, 0, 0)), revolution_arc=20.356645861, mode=Mode.PRIVATE)
    chamfer_2_piece_3 = chamfer_2_piece_3 - Plane(origin=(7, 0, 0), x_dir=(0, 0, -1), z_dir=(-1, 0, 0)) * Cylinder(8, 401, mode=Mode.PRIVATE)
    add(chamfer_2_piece_3, mode=Mode.SUBTRACT)
    with BuildSketch(Plane(origin=(7, -15, 0), x_dir=(0, 0, 1), z_dir=(0, -1, 0))) as chamfer_2_piece_4:
        Polygon((1.5 + CHAMFER_2_SIZE, 0), (1.5, CHAMFER_2_SIZE), (1.5, 0), align=None)
    revolve(axis=Axis((7, -15, 0), (-1, 0, 0)), mode=Mode.SUBTRACT)
    with BuildSketch(Plane(origin=(7, -20, 0), x_dir=(0, 0, 1), z_dir=(0, -1, 0))) as chamfer_2_piece_5:
        Polygon((1.5 + CHAMFER_2_SIZE, 0), (1.5, CHAMFER_2_SIZE), (1.5, 0), align=None)
    revolve(axis=Axis((7, -20, 0), (-1, 0, 0)), mode=Mode.SUBTRACT)
    with BuildSketch(Plane(origin=(7, -25, 0), x_dir=(0, 0, 1), z_dir=(0, -1, 0))) as chamfer_2_piece_6:
        Polygon((1.5 + CHAMFER_2_SIZE, 0), (1.5, CHAMFER_2_SIZE), (1.5, 0), align=None)
    revolve(axis=Axis((7, -25, 0), (-1, 0, 0)), mode=Mode.SUBTRACT)
    with BuildSketch(Plane(origin=(7, -30, 0), x_dir=(0, 0, 1), z_dir=(0, -1, 0))) as chamfer_2_piece_7:
        Polygon((1.5 + CHAMFER_2_SIZE, 0), (1.5, CHAMFER_2_SIZE), (1.5, 0), align=None)
    revolve(axis=Axis((7, -30, 0), (-1, 0, 0)), mode=Mode.SUBTRACT)
    with BuildSketch(Plane(origin=(7, -35, 0), x_dir=(0, 0, 1), z_dir=(0, -1, 0))) as chamfer_2_piece_8:
        Polygon((1.5 + CHAMFER_2_SIZE, 0), (1.5, CHAMFER_2_SIZE), (1.5, 0), align=None)
    revolve(axis=Axis((7, -35, 0), (-1, 0, 0)), mode=Mode.SUBTRACT)
    with BuildSketch(Plane(origin=(5, -29.614285714, -103.86045485), x_dir=(0, 0.29884451461423694, 0.9543018160335759), z_dir=(0, 0.9543018160335759, -0.29884451461423694))) as chamfer_2_piece_9_section:
        Polygon((100 + CHAMFER_2_SIZE, 0), (100, CHAMFER_2_SIZE), (100, 0), align=None)
    chamfer_2_piece_9 = revolve(axis=Axis((5, -29.614285714, -103.86045485), (1, 0, 0)), revolution_arc=20.356645861, mode=Mode.PRIVATE)
    chamfer_2_piece_9 = chamfer_2_piece_9 - Plane(origin=(5, 0, 0), x_dir=(0, 0, -1), z_dir=(-1, 0, 0)) * Cylinder(8, 401, mode=Mode.PRIVATE)
    add(chamfer_2_piece_9, mode=Mode.SUBTRACT)
    with BuildSketch(Plane(origin=(5, -35, 0), x_dir=(0, 0.05178571428571369, -0.9986582197107869), z_dir=(0, 0.9986582197107869, 0.05178571428571369))) as chamfer_2_piece_10:
        Polygon((4 - CHAMFER_2_SIZE, 0), (4, -CHAMFER_2_SIZE), (4, 0), align=None)
    revolve(axis=Axis((5, -35, 0), (-1, 0, 0)), revolution_arc=185.936861294, mode=Mode.SUBTRACT)
    with BuildSketch(Plane(origin=(5, -29.614285714, 103.86045485), x_dir=(0, -0.05178571428571552, -0.9986582197107868), z_dir=(0, -0.9986582197107868, 0.05178571428571552))) as chamfer_2_piece_11_section:
        Polygon((100, CHAMFER_2_SIZE), (100 + CHAMFER_2_SIZE, 0), (100, 0), align=None)
    chamfer_2_piece_11 = revolve(axis=Axis((5, -29.614285714, 103.86045485), (1, 0, 0)), revolution_arc=20.356645861, mode=Mode.PRIVATE)
    chamfer_2_piece_11 = chamfer_2_piece_11 - Plane(origin=(5, 0, 0), x_dir=(0, 0, -1), z_dir=(-1, 0, 0)) * Cylinder(8, 401, mode=Mode.PRIVATE)
    add(chamfer_2_piece_11, mode=Mode.SUBTRACT)
    with BuildSketch(Plane(origin=(5, -35, 0), x_dir=(0, 0, 1), z_dir=(0, -1, 0))) as chamfer_2_piece_12:
        Polygon((1.5 + CHAMFER_2_SIZE, 0), (1.5, -CHAMFER_2_SIZE), (1.5, 0), align=None)
    revolve(axis=Axis((5, -35, 0), (-1, 0, 0)), mode=Mode.SUBTRACT)
    with BuildSketch(Plane(origin=(5, -30, 0), x_dir=(0, 0, 1), z_dir=(0, -1, 0))) as chamfer_2_piece_13:
        Polygon((1.5 + CHAMFER_2_SIZE, 0), (1.5, -CHAMFER_2_SIZE), (1.5, 0), align=None)
    revolve(axis=Axis((5, -30, 0), (-1, 0, 0)), mode=Mode.SUBTRACT)
    with BuildSketch(Plane(origin=(5, -25, 0), x_dir=(0, 0, 1), z_dir=(0, -1, 0))) as chamfer_2_piece_14:
        Polygon((1.5 + CHAMFER_2_SIZE, 0), (1.5, -CHAMFER_2_SIZE), (1.5, 0), align=None)
    revolve(axis=Axis((5, -25, 0), (-1, 0, 0)), mode=Mode.SUBTRACT)
    with BuildSketch(Plane(origin=(5, -20, 0), x_dir=(0, 0, 1), z_dir=(0, -1, 0))) as chamfer_2_piece_15:
        Polygon((1.5 + CHAMFER_2_SIZE, 0), (1.5, -CHAMFER_2_SIZE), (1.5, 0), align=None)
    revolve(axis=Axis((5, -20, 0), (-1, 0, 0)), mode=Mode.SUBTRACT)
    with BuildSketch(Plane(origin=(5, -15, 0), x_dir=(0, 0, 1), z_dir=(0, -1, 0))) as chamfer_2_piece_16:
        Polygon((1.5 + CHAMFER_2_SIZE, 0), (1.5, -CHAMFER_2_SIZE), (1.5, 0), align=None)
    revolve(axis=Axis((5, -15, 0), (-1, 0, 0)), mode=Mode.SUBTRACT)


solid = part.part
